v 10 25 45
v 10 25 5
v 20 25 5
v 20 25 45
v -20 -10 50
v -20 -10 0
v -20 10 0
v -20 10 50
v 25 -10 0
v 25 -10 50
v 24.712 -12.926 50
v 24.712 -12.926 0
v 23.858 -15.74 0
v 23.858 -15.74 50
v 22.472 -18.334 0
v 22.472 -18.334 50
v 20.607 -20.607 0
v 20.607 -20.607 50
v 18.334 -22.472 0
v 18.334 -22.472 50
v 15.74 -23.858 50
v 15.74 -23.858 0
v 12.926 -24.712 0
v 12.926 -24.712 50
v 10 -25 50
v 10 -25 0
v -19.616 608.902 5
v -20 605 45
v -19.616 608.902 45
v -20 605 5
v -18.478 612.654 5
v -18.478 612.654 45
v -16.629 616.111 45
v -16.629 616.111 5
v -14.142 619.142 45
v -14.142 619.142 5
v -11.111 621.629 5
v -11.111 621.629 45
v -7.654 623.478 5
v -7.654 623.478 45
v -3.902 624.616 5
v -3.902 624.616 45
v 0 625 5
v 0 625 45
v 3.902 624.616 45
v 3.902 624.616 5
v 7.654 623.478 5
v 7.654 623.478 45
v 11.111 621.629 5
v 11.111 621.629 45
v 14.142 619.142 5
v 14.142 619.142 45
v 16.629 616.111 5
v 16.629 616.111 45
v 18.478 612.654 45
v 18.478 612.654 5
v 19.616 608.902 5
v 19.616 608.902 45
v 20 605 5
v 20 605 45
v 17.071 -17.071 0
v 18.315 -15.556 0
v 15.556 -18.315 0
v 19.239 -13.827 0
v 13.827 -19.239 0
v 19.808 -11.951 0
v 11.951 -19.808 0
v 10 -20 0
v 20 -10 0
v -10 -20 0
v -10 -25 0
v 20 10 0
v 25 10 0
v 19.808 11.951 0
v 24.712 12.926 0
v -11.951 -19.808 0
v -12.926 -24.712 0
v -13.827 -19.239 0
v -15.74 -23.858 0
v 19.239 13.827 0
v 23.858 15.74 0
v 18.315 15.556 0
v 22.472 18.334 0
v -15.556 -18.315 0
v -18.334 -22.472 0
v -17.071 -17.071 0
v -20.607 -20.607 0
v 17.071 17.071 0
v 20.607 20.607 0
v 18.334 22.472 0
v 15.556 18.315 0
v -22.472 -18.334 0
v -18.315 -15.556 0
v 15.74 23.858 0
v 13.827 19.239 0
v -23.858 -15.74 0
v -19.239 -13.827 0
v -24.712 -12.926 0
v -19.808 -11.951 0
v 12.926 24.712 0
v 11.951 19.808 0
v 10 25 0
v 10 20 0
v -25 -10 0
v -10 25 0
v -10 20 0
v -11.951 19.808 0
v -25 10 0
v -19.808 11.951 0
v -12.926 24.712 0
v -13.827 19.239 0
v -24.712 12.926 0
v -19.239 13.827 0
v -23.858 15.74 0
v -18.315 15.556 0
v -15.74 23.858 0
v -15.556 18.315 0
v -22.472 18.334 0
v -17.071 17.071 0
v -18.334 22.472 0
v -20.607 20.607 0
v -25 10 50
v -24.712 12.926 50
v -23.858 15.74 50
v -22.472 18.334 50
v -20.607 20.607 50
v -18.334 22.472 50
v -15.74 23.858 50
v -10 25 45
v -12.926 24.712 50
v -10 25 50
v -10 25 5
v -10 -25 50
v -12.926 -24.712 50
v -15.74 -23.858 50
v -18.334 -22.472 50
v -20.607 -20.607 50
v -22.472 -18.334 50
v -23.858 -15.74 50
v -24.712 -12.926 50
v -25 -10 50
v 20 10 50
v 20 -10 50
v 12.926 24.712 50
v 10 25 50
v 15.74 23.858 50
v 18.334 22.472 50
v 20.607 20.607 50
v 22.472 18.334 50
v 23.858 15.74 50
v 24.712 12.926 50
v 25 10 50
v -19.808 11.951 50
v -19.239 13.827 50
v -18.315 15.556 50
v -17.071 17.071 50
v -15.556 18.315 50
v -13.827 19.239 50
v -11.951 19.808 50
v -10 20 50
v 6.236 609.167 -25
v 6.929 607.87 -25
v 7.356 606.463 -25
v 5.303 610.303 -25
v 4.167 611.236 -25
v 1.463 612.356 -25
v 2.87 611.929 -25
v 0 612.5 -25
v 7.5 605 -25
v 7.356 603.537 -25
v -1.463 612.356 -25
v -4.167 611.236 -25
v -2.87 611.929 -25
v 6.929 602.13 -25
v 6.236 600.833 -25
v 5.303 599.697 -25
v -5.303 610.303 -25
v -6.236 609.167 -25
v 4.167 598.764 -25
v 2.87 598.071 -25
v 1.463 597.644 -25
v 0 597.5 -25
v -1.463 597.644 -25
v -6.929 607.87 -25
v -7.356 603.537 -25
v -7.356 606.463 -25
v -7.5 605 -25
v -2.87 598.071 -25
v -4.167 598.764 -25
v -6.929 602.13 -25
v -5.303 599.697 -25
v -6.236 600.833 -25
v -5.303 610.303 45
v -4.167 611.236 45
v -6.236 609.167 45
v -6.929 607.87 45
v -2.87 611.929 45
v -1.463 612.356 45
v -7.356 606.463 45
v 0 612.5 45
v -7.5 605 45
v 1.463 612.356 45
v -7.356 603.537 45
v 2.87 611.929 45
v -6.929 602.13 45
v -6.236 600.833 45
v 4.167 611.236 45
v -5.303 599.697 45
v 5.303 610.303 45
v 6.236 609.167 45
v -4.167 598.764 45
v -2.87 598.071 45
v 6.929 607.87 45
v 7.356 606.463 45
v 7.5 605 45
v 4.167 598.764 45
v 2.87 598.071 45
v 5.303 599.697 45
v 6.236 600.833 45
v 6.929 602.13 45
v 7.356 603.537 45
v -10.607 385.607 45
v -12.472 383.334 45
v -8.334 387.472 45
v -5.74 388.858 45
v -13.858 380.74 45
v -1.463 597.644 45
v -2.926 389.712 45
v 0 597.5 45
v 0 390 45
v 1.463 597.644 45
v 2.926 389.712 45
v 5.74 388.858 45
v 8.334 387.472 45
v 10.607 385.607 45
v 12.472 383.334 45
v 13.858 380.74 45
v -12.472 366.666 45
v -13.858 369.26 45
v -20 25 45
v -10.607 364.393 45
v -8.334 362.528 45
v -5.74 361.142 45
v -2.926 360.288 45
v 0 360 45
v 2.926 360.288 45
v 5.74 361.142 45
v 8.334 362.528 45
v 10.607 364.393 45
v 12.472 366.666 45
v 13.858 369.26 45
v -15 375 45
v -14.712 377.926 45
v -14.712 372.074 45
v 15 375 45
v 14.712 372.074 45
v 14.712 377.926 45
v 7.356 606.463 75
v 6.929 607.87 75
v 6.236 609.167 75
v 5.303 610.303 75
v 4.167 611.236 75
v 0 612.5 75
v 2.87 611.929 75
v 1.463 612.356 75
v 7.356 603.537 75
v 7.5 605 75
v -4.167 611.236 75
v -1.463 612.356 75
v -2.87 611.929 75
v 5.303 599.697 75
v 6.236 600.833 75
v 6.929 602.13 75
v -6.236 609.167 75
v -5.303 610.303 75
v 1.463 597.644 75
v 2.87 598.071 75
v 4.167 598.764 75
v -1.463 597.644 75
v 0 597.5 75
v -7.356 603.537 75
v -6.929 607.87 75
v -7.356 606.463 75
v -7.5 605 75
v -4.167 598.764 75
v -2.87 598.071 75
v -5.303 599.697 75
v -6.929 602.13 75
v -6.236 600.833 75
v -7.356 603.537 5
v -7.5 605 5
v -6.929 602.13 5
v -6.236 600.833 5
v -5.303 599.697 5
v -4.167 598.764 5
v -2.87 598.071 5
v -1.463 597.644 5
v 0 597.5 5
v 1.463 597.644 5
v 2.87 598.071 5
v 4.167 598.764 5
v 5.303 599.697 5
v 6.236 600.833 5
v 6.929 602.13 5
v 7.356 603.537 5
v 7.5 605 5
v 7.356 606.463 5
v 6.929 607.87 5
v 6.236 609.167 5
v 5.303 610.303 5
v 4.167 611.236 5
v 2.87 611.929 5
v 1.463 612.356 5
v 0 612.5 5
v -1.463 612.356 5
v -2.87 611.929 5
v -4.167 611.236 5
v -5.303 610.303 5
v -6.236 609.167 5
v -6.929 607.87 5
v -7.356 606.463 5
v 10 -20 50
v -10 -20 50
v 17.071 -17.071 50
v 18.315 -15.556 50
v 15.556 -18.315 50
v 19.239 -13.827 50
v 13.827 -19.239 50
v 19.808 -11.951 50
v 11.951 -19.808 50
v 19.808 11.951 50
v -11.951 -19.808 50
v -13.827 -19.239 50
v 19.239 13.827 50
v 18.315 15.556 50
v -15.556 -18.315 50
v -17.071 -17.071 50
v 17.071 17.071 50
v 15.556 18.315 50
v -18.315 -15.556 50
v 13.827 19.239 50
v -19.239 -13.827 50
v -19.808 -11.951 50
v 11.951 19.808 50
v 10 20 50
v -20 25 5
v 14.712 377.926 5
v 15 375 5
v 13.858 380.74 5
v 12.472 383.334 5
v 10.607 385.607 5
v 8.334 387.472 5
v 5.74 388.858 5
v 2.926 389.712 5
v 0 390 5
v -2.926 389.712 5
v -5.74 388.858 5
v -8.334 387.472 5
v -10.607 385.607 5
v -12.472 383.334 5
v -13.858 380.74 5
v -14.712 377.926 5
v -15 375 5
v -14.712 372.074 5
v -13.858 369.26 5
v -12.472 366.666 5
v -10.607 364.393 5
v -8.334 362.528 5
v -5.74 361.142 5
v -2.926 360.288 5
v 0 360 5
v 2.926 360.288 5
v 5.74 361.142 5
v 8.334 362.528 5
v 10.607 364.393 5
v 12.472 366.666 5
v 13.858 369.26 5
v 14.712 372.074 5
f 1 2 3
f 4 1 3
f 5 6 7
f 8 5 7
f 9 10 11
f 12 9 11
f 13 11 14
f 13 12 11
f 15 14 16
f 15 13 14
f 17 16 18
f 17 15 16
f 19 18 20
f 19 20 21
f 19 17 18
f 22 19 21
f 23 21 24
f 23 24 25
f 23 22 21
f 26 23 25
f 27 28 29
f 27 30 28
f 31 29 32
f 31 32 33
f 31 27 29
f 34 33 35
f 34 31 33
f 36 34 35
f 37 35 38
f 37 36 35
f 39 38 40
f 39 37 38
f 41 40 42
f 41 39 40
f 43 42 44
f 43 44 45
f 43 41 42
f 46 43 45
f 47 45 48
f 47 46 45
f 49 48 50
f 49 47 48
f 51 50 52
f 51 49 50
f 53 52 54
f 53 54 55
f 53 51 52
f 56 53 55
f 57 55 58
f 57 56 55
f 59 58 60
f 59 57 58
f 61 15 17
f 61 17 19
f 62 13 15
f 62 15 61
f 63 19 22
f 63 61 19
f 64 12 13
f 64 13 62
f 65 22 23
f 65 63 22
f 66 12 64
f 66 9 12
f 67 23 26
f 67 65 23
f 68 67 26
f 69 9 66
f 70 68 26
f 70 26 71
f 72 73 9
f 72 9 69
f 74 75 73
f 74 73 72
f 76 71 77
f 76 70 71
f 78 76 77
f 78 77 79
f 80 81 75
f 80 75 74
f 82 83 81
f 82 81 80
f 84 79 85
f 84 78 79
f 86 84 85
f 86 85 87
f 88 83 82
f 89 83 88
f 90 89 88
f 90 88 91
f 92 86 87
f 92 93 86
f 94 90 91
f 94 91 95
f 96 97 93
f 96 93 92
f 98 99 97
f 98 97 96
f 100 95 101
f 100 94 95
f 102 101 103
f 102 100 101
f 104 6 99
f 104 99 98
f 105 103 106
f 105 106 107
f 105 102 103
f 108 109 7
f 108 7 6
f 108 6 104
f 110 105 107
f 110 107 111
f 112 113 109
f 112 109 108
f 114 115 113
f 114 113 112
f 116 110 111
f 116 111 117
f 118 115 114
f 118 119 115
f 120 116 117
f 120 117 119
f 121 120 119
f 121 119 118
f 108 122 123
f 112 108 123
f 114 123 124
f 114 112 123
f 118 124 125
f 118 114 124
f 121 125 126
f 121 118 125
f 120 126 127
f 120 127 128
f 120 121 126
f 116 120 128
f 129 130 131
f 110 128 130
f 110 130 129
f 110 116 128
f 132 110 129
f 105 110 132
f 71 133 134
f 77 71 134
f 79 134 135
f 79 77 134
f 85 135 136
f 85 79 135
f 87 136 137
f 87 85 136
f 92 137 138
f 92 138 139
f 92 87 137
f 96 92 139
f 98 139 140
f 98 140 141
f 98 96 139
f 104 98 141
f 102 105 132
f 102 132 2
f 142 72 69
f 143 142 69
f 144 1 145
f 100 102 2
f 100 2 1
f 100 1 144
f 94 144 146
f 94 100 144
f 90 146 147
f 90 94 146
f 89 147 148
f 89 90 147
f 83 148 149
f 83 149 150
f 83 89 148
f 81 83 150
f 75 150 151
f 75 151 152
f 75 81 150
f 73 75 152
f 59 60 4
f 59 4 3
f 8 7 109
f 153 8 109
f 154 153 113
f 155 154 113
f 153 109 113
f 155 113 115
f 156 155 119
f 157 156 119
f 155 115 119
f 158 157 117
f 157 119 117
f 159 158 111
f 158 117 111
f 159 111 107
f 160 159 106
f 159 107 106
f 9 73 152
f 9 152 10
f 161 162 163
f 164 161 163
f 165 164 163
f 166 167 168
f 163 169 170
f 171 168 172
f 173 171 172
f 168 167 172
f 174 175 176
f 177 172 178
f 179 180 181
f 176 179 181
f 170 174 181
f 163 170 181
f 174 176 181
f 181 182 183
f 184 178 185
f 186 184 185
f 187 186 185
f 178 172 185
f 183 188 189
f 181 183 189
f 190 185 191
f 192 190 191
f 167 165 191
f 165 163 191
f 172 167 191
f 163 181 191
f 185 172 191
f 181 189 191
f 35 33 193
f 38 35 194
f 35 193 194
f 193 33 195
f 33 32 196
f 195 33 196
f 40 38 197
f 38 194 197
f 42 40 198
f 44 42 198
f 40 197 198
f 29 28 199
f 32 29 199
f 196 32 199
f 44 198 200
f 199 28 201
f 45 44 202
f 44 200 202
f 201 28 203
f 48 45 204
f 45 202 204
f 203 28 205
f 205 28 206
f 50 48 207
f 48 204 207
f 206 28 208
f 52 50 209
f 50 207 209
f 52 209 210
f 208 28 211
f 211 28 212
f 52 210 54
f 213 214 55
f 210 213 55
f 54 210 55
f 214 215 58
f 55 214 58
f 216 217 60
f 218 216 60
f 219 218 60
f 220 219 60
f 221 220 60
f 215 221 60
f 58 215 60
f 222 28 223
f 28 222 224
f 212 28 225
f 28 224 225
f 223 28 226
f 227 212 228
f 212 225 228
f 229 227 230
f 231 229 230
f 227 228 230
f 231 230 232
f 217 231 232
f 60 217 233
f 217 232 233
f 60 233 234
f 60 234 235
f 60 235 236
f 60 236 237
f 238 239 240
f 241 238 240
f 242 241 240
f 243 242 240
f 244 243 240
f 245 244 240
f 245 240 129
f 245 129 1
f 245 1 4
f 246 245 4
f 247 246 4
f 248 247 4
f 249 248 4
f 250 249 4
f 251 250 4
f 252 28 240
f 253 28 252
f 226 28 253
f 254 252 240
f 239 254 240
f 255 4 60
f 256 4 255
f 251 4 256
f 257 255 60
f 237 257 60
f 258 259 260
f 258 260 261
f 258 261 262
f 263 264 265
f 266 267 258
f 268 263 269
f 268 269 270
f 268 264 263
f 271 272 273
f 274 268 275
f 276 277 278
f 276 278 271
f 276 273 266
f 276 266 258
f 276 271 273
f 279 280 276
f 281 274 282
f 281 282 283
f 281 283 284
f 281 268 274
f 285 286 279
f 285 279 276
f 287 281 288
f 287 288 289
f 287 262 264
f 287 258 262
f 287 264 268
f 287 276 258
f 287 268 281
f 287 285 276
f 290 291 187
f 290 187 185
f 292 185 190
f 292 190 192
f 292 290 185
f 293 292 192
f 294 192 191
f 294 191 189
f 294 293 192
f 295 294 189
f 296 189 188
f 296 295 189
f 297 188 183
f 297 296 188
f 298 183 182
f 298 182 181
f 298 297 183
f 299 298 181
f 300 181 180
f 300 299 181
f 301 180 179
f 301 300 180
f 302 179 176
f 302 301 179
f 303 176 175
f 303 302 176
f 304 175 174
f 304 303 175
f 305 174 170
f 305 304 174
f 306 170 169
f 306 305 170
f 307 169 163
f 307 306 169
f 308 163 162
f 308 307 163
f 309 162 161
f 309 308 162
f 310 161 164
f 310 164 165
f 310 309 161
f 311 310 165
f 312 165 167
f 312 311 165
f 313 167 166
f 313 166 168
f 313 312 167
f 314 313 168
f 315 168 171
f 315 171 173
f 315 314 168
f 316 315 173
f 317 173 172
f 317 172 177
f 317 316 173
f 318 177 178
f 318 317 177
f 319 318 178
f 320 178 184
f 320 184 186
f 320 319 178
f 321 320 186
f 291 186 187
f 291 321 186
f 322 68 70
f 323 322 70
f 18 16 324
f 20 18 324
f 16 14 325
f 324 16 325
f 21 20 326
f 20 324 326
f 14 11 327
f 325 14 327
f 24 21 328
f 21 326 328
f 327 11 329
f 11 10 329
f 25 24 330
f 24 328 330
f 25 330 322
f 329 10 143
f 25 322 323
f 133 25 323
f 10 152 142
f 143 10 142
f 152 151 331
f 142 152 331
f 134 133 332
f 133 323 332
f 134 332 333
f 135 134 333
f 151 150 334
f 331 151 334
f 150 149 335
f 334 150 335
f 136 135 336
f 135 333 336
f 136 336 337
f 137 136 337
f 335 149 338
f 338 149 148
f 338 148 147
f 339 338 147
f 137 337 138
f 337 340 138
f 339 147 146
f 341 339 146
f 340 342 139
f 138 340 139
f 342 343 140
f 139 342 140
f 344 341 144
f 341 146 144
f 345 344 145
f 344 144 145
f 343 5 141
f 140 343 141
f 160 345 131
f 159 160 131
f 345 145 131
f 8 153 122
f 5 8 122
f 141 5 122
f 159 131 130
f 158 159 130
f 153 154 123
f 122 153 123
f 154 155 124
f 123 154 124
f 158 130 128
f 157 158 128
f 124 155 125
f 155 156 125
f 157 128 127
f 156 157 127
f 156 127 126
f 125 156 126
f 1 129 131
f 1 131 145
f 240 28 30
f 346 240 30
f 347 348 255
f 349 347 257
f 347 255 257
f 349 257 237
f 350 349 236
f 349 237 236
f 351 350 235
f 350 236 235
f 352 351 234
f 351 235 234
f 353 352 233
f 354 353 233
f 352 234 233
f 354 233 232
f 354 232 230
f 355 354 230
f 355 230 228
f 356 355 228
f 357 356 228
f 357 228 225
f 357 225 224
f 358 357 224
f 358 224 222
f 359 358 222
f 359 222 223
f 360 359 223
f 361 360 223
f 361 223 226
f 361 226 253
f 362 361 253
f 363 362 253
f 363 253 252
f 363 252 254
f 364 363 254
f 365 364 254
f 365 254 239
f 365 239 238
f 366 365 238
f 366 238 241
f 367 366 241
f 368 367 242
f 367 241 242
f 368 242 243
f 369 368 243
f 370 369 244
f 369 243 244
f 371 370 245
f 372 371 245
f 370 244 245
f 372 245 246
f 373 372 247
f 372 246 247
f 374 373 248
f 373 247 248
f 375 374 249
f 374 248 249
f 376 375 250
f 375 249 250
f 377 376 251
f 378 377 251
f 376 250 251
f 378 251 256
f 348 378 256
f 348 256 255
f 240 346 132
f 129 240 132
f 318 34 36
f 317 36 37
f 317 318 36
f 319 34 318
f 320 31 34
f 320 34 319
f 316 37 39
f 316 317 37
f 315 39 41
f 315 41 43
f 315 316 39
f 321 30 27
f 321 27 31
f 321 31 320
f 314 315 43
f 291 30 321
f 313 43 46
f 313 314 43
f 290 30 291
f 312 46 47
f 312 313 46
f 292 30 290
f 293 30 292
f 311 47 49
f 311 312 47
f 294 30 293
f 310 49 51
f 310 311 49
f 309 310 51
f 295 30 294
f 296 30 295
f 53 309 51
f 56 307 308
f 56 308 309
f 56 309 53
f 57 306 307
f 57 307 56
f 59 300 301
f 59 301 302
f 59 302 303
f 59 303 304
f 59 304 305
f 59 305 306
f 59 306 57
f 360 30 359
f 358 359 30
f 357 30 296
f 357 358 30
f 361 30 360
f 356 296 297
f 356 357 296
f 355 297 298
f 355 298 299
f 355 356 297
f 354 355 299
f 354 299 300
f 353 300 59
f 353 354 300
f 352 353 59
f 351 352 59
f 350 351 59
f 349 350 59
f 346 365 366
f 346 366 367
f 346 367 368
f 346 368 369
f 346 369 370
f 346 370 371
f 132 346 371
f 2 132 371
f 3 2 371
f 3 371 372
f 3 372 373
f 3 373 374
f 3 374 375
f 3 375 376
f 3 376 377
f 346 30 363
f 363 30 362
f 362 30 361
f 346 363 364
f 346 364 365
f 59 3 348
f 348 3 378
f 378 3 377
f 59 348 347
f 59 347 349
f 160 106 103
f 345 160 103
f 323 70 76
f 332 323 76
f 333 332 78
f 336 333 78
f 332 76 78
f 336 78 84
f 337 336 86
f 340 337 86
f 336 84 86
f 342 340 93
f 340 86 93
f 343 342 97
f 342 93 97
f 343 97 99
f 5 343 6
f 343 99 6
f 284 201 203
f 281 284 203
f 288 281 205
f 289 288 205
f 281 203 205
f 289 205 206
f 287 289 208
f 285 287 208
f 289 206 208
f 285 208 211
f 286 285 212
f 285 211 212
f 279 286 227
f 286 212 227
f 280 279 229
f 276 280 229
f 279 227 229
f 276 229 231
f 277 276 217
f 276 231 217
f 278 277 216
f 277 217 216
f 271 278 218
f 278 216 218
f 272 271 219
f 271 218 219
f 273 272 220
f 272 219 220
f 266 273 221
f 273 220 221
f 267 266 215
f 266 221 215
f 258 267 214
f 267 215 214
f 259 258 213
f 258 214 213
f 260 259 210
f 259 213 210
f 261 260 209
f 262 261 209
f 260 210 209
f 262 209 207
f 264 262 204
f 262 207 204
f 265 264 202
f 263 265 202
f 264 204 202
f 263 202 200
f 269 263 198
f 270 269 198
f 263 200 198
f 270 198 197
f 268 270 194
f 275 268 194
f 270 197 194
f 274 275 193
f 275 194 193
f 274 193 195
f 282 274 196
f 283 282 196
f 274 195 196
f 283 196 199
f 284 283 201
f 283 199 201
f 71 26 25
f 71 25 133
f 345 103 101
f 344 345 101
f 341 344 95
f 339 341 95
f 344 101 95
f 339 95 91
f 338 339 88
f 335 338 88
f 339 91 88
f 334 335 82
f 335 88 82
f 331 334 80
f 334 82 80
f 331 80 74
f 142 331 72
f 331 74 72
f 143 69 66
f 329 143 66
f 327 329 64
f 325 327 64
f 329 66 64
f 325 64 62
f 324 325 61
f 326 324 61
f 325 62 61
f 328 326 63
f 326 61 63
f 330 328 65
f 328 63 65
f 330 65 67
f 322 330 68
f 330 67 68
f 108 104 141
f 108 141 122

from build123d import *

# Parameters (mm, degrees)
EXTRUDE_1_DEPTH     = 50
SKETCH_2_W          = 40
SKETCH_2_H          = 40
EXTRUDE_2_DEPTH     = 600
FILLET_1_RADIUS     = 20
FILLET_1_LENGTH     = 40
SKETCH_5_R          = 7.5
EXTRUDE_4_DEPTH     = 30
SKETCH_6_R          = 15
CUT_EXTRUDE_1_DEPTH = 631.892225344


with BuildPart() as part:
    # 草图1 → 凸台-拉伸1 (new body)
    with BuildSketch(Plane.XY):
        with BuildLine():
            Line((-10, 25), (10, 25))
            ThreePointArc((10, 25), (20.606601718, 20.606601718), (25, 10))
            Line((25, 10), (25, -10))
            ThreePointArc((25, -10), (20.606601718, -20.606601718), (10, -25))
            Line((10, -25), (-10, -25))
            ThreePointArc((-10, -25), (-20.606601718, -20.606601718), (-25, -10))
            Line((-25, -10), (-25, 10))
            ThreePointArc((-25, 10), (-20.606601718, 20.606601718), (-10, 25))
        make_face()
        with BuildLine():
            Line((-10, 20), (10, 20))
            ThreePointArc((10, 20), (17.071067812, 17.071067812), (20, 10))
            Line((20, 10), (20, -10))
            ThreePointArc((20, -10), (17.071067812, -17.071067812), (10, -20))
            Line((10, -20), (-10, -20))
            ThreePointArc((-10, -20), (-17.071067812, -17.071067812), (-20, -10))
            Line((-20, -10), (-20, 10))
            ThreePointArc((-20, 10), (-17.071067812, 17.071067812), (-10, 20))
        make_face(mode=Mode.SUBTRACT)
    extrude(amount=EXTRUDE_1_DEPTH)

    # 草图2 → 凸台-拉伸2 (add)
    with BuildSketch(Plane(origin=(0, 25, 0), x_dir=(1, 0, 0), z_dir=(0, 1, 0))):
        with Locations((0, -25)):
            Rectangle(SKETCH_2_W, SKETCH_2_H)
    extrude(amount=EXTRUDE_2_DEPTH)

    # 圆角1: full round fillet: the end face becomes a half cylinder, R = half its width
    fillet_1_face = Plane((0, 625, 25), x_dir=(0, 0, -1), z_dir=(0, 1, 0))  # on the end face: x along it, z out of the body
    fillet_1_slab = fillet_1_face.offset(-FILLET_1_RADIUS / 2) * Box(FILLET_1_LENGTH, 2 * FILLET_1_RADIUS, FILLET_1_RADIUS, mode=Mode.PRIVATE)  # the body's end, R deep
    fillet_1_round = Plane((0, 605, 25), x_dir=(0, 1, 0), z_dir=(0, 0, -1)) * Cylinder(FILLET_1_RADIUS, FILLET_1_LENGTH, mode=Mode.PRIVATE)  # its axis R under the face
    add(fillet_1_slab - fillet_1_round, mode=Mode.SUBTRACT)

    # 草图5 → 凸台-拉伸4 (add)
    with BuildSketch(Plane.XY.offset(45)):
        with Locations(Location((0, 605, 0), (0, 0, 180))):
            Circle(SKETCH_5_R)
    extrude_4 = extrude(amount=EXTRUDE_4_DEPTH)

    # 镜向2: 凸台-拉伸4 across plane
    add(extrude_4.mirror(Plane.XY.offset(25)))

    # 草图6 → 切除-拉伸1 (cut, through all)
    with BuildSketch(Plane(origin=(25, 0, 45), x_dir=(1, 0, 0), z_dir=(0, 0, 1))):
        with Locations((-25, 375)):
            Circle(SKETCH_6_R)
    extrude(amount=-CUT_EXTRUDE_1_DEPTH, mode=Mode.SUBTRACT)


solid = part.part
